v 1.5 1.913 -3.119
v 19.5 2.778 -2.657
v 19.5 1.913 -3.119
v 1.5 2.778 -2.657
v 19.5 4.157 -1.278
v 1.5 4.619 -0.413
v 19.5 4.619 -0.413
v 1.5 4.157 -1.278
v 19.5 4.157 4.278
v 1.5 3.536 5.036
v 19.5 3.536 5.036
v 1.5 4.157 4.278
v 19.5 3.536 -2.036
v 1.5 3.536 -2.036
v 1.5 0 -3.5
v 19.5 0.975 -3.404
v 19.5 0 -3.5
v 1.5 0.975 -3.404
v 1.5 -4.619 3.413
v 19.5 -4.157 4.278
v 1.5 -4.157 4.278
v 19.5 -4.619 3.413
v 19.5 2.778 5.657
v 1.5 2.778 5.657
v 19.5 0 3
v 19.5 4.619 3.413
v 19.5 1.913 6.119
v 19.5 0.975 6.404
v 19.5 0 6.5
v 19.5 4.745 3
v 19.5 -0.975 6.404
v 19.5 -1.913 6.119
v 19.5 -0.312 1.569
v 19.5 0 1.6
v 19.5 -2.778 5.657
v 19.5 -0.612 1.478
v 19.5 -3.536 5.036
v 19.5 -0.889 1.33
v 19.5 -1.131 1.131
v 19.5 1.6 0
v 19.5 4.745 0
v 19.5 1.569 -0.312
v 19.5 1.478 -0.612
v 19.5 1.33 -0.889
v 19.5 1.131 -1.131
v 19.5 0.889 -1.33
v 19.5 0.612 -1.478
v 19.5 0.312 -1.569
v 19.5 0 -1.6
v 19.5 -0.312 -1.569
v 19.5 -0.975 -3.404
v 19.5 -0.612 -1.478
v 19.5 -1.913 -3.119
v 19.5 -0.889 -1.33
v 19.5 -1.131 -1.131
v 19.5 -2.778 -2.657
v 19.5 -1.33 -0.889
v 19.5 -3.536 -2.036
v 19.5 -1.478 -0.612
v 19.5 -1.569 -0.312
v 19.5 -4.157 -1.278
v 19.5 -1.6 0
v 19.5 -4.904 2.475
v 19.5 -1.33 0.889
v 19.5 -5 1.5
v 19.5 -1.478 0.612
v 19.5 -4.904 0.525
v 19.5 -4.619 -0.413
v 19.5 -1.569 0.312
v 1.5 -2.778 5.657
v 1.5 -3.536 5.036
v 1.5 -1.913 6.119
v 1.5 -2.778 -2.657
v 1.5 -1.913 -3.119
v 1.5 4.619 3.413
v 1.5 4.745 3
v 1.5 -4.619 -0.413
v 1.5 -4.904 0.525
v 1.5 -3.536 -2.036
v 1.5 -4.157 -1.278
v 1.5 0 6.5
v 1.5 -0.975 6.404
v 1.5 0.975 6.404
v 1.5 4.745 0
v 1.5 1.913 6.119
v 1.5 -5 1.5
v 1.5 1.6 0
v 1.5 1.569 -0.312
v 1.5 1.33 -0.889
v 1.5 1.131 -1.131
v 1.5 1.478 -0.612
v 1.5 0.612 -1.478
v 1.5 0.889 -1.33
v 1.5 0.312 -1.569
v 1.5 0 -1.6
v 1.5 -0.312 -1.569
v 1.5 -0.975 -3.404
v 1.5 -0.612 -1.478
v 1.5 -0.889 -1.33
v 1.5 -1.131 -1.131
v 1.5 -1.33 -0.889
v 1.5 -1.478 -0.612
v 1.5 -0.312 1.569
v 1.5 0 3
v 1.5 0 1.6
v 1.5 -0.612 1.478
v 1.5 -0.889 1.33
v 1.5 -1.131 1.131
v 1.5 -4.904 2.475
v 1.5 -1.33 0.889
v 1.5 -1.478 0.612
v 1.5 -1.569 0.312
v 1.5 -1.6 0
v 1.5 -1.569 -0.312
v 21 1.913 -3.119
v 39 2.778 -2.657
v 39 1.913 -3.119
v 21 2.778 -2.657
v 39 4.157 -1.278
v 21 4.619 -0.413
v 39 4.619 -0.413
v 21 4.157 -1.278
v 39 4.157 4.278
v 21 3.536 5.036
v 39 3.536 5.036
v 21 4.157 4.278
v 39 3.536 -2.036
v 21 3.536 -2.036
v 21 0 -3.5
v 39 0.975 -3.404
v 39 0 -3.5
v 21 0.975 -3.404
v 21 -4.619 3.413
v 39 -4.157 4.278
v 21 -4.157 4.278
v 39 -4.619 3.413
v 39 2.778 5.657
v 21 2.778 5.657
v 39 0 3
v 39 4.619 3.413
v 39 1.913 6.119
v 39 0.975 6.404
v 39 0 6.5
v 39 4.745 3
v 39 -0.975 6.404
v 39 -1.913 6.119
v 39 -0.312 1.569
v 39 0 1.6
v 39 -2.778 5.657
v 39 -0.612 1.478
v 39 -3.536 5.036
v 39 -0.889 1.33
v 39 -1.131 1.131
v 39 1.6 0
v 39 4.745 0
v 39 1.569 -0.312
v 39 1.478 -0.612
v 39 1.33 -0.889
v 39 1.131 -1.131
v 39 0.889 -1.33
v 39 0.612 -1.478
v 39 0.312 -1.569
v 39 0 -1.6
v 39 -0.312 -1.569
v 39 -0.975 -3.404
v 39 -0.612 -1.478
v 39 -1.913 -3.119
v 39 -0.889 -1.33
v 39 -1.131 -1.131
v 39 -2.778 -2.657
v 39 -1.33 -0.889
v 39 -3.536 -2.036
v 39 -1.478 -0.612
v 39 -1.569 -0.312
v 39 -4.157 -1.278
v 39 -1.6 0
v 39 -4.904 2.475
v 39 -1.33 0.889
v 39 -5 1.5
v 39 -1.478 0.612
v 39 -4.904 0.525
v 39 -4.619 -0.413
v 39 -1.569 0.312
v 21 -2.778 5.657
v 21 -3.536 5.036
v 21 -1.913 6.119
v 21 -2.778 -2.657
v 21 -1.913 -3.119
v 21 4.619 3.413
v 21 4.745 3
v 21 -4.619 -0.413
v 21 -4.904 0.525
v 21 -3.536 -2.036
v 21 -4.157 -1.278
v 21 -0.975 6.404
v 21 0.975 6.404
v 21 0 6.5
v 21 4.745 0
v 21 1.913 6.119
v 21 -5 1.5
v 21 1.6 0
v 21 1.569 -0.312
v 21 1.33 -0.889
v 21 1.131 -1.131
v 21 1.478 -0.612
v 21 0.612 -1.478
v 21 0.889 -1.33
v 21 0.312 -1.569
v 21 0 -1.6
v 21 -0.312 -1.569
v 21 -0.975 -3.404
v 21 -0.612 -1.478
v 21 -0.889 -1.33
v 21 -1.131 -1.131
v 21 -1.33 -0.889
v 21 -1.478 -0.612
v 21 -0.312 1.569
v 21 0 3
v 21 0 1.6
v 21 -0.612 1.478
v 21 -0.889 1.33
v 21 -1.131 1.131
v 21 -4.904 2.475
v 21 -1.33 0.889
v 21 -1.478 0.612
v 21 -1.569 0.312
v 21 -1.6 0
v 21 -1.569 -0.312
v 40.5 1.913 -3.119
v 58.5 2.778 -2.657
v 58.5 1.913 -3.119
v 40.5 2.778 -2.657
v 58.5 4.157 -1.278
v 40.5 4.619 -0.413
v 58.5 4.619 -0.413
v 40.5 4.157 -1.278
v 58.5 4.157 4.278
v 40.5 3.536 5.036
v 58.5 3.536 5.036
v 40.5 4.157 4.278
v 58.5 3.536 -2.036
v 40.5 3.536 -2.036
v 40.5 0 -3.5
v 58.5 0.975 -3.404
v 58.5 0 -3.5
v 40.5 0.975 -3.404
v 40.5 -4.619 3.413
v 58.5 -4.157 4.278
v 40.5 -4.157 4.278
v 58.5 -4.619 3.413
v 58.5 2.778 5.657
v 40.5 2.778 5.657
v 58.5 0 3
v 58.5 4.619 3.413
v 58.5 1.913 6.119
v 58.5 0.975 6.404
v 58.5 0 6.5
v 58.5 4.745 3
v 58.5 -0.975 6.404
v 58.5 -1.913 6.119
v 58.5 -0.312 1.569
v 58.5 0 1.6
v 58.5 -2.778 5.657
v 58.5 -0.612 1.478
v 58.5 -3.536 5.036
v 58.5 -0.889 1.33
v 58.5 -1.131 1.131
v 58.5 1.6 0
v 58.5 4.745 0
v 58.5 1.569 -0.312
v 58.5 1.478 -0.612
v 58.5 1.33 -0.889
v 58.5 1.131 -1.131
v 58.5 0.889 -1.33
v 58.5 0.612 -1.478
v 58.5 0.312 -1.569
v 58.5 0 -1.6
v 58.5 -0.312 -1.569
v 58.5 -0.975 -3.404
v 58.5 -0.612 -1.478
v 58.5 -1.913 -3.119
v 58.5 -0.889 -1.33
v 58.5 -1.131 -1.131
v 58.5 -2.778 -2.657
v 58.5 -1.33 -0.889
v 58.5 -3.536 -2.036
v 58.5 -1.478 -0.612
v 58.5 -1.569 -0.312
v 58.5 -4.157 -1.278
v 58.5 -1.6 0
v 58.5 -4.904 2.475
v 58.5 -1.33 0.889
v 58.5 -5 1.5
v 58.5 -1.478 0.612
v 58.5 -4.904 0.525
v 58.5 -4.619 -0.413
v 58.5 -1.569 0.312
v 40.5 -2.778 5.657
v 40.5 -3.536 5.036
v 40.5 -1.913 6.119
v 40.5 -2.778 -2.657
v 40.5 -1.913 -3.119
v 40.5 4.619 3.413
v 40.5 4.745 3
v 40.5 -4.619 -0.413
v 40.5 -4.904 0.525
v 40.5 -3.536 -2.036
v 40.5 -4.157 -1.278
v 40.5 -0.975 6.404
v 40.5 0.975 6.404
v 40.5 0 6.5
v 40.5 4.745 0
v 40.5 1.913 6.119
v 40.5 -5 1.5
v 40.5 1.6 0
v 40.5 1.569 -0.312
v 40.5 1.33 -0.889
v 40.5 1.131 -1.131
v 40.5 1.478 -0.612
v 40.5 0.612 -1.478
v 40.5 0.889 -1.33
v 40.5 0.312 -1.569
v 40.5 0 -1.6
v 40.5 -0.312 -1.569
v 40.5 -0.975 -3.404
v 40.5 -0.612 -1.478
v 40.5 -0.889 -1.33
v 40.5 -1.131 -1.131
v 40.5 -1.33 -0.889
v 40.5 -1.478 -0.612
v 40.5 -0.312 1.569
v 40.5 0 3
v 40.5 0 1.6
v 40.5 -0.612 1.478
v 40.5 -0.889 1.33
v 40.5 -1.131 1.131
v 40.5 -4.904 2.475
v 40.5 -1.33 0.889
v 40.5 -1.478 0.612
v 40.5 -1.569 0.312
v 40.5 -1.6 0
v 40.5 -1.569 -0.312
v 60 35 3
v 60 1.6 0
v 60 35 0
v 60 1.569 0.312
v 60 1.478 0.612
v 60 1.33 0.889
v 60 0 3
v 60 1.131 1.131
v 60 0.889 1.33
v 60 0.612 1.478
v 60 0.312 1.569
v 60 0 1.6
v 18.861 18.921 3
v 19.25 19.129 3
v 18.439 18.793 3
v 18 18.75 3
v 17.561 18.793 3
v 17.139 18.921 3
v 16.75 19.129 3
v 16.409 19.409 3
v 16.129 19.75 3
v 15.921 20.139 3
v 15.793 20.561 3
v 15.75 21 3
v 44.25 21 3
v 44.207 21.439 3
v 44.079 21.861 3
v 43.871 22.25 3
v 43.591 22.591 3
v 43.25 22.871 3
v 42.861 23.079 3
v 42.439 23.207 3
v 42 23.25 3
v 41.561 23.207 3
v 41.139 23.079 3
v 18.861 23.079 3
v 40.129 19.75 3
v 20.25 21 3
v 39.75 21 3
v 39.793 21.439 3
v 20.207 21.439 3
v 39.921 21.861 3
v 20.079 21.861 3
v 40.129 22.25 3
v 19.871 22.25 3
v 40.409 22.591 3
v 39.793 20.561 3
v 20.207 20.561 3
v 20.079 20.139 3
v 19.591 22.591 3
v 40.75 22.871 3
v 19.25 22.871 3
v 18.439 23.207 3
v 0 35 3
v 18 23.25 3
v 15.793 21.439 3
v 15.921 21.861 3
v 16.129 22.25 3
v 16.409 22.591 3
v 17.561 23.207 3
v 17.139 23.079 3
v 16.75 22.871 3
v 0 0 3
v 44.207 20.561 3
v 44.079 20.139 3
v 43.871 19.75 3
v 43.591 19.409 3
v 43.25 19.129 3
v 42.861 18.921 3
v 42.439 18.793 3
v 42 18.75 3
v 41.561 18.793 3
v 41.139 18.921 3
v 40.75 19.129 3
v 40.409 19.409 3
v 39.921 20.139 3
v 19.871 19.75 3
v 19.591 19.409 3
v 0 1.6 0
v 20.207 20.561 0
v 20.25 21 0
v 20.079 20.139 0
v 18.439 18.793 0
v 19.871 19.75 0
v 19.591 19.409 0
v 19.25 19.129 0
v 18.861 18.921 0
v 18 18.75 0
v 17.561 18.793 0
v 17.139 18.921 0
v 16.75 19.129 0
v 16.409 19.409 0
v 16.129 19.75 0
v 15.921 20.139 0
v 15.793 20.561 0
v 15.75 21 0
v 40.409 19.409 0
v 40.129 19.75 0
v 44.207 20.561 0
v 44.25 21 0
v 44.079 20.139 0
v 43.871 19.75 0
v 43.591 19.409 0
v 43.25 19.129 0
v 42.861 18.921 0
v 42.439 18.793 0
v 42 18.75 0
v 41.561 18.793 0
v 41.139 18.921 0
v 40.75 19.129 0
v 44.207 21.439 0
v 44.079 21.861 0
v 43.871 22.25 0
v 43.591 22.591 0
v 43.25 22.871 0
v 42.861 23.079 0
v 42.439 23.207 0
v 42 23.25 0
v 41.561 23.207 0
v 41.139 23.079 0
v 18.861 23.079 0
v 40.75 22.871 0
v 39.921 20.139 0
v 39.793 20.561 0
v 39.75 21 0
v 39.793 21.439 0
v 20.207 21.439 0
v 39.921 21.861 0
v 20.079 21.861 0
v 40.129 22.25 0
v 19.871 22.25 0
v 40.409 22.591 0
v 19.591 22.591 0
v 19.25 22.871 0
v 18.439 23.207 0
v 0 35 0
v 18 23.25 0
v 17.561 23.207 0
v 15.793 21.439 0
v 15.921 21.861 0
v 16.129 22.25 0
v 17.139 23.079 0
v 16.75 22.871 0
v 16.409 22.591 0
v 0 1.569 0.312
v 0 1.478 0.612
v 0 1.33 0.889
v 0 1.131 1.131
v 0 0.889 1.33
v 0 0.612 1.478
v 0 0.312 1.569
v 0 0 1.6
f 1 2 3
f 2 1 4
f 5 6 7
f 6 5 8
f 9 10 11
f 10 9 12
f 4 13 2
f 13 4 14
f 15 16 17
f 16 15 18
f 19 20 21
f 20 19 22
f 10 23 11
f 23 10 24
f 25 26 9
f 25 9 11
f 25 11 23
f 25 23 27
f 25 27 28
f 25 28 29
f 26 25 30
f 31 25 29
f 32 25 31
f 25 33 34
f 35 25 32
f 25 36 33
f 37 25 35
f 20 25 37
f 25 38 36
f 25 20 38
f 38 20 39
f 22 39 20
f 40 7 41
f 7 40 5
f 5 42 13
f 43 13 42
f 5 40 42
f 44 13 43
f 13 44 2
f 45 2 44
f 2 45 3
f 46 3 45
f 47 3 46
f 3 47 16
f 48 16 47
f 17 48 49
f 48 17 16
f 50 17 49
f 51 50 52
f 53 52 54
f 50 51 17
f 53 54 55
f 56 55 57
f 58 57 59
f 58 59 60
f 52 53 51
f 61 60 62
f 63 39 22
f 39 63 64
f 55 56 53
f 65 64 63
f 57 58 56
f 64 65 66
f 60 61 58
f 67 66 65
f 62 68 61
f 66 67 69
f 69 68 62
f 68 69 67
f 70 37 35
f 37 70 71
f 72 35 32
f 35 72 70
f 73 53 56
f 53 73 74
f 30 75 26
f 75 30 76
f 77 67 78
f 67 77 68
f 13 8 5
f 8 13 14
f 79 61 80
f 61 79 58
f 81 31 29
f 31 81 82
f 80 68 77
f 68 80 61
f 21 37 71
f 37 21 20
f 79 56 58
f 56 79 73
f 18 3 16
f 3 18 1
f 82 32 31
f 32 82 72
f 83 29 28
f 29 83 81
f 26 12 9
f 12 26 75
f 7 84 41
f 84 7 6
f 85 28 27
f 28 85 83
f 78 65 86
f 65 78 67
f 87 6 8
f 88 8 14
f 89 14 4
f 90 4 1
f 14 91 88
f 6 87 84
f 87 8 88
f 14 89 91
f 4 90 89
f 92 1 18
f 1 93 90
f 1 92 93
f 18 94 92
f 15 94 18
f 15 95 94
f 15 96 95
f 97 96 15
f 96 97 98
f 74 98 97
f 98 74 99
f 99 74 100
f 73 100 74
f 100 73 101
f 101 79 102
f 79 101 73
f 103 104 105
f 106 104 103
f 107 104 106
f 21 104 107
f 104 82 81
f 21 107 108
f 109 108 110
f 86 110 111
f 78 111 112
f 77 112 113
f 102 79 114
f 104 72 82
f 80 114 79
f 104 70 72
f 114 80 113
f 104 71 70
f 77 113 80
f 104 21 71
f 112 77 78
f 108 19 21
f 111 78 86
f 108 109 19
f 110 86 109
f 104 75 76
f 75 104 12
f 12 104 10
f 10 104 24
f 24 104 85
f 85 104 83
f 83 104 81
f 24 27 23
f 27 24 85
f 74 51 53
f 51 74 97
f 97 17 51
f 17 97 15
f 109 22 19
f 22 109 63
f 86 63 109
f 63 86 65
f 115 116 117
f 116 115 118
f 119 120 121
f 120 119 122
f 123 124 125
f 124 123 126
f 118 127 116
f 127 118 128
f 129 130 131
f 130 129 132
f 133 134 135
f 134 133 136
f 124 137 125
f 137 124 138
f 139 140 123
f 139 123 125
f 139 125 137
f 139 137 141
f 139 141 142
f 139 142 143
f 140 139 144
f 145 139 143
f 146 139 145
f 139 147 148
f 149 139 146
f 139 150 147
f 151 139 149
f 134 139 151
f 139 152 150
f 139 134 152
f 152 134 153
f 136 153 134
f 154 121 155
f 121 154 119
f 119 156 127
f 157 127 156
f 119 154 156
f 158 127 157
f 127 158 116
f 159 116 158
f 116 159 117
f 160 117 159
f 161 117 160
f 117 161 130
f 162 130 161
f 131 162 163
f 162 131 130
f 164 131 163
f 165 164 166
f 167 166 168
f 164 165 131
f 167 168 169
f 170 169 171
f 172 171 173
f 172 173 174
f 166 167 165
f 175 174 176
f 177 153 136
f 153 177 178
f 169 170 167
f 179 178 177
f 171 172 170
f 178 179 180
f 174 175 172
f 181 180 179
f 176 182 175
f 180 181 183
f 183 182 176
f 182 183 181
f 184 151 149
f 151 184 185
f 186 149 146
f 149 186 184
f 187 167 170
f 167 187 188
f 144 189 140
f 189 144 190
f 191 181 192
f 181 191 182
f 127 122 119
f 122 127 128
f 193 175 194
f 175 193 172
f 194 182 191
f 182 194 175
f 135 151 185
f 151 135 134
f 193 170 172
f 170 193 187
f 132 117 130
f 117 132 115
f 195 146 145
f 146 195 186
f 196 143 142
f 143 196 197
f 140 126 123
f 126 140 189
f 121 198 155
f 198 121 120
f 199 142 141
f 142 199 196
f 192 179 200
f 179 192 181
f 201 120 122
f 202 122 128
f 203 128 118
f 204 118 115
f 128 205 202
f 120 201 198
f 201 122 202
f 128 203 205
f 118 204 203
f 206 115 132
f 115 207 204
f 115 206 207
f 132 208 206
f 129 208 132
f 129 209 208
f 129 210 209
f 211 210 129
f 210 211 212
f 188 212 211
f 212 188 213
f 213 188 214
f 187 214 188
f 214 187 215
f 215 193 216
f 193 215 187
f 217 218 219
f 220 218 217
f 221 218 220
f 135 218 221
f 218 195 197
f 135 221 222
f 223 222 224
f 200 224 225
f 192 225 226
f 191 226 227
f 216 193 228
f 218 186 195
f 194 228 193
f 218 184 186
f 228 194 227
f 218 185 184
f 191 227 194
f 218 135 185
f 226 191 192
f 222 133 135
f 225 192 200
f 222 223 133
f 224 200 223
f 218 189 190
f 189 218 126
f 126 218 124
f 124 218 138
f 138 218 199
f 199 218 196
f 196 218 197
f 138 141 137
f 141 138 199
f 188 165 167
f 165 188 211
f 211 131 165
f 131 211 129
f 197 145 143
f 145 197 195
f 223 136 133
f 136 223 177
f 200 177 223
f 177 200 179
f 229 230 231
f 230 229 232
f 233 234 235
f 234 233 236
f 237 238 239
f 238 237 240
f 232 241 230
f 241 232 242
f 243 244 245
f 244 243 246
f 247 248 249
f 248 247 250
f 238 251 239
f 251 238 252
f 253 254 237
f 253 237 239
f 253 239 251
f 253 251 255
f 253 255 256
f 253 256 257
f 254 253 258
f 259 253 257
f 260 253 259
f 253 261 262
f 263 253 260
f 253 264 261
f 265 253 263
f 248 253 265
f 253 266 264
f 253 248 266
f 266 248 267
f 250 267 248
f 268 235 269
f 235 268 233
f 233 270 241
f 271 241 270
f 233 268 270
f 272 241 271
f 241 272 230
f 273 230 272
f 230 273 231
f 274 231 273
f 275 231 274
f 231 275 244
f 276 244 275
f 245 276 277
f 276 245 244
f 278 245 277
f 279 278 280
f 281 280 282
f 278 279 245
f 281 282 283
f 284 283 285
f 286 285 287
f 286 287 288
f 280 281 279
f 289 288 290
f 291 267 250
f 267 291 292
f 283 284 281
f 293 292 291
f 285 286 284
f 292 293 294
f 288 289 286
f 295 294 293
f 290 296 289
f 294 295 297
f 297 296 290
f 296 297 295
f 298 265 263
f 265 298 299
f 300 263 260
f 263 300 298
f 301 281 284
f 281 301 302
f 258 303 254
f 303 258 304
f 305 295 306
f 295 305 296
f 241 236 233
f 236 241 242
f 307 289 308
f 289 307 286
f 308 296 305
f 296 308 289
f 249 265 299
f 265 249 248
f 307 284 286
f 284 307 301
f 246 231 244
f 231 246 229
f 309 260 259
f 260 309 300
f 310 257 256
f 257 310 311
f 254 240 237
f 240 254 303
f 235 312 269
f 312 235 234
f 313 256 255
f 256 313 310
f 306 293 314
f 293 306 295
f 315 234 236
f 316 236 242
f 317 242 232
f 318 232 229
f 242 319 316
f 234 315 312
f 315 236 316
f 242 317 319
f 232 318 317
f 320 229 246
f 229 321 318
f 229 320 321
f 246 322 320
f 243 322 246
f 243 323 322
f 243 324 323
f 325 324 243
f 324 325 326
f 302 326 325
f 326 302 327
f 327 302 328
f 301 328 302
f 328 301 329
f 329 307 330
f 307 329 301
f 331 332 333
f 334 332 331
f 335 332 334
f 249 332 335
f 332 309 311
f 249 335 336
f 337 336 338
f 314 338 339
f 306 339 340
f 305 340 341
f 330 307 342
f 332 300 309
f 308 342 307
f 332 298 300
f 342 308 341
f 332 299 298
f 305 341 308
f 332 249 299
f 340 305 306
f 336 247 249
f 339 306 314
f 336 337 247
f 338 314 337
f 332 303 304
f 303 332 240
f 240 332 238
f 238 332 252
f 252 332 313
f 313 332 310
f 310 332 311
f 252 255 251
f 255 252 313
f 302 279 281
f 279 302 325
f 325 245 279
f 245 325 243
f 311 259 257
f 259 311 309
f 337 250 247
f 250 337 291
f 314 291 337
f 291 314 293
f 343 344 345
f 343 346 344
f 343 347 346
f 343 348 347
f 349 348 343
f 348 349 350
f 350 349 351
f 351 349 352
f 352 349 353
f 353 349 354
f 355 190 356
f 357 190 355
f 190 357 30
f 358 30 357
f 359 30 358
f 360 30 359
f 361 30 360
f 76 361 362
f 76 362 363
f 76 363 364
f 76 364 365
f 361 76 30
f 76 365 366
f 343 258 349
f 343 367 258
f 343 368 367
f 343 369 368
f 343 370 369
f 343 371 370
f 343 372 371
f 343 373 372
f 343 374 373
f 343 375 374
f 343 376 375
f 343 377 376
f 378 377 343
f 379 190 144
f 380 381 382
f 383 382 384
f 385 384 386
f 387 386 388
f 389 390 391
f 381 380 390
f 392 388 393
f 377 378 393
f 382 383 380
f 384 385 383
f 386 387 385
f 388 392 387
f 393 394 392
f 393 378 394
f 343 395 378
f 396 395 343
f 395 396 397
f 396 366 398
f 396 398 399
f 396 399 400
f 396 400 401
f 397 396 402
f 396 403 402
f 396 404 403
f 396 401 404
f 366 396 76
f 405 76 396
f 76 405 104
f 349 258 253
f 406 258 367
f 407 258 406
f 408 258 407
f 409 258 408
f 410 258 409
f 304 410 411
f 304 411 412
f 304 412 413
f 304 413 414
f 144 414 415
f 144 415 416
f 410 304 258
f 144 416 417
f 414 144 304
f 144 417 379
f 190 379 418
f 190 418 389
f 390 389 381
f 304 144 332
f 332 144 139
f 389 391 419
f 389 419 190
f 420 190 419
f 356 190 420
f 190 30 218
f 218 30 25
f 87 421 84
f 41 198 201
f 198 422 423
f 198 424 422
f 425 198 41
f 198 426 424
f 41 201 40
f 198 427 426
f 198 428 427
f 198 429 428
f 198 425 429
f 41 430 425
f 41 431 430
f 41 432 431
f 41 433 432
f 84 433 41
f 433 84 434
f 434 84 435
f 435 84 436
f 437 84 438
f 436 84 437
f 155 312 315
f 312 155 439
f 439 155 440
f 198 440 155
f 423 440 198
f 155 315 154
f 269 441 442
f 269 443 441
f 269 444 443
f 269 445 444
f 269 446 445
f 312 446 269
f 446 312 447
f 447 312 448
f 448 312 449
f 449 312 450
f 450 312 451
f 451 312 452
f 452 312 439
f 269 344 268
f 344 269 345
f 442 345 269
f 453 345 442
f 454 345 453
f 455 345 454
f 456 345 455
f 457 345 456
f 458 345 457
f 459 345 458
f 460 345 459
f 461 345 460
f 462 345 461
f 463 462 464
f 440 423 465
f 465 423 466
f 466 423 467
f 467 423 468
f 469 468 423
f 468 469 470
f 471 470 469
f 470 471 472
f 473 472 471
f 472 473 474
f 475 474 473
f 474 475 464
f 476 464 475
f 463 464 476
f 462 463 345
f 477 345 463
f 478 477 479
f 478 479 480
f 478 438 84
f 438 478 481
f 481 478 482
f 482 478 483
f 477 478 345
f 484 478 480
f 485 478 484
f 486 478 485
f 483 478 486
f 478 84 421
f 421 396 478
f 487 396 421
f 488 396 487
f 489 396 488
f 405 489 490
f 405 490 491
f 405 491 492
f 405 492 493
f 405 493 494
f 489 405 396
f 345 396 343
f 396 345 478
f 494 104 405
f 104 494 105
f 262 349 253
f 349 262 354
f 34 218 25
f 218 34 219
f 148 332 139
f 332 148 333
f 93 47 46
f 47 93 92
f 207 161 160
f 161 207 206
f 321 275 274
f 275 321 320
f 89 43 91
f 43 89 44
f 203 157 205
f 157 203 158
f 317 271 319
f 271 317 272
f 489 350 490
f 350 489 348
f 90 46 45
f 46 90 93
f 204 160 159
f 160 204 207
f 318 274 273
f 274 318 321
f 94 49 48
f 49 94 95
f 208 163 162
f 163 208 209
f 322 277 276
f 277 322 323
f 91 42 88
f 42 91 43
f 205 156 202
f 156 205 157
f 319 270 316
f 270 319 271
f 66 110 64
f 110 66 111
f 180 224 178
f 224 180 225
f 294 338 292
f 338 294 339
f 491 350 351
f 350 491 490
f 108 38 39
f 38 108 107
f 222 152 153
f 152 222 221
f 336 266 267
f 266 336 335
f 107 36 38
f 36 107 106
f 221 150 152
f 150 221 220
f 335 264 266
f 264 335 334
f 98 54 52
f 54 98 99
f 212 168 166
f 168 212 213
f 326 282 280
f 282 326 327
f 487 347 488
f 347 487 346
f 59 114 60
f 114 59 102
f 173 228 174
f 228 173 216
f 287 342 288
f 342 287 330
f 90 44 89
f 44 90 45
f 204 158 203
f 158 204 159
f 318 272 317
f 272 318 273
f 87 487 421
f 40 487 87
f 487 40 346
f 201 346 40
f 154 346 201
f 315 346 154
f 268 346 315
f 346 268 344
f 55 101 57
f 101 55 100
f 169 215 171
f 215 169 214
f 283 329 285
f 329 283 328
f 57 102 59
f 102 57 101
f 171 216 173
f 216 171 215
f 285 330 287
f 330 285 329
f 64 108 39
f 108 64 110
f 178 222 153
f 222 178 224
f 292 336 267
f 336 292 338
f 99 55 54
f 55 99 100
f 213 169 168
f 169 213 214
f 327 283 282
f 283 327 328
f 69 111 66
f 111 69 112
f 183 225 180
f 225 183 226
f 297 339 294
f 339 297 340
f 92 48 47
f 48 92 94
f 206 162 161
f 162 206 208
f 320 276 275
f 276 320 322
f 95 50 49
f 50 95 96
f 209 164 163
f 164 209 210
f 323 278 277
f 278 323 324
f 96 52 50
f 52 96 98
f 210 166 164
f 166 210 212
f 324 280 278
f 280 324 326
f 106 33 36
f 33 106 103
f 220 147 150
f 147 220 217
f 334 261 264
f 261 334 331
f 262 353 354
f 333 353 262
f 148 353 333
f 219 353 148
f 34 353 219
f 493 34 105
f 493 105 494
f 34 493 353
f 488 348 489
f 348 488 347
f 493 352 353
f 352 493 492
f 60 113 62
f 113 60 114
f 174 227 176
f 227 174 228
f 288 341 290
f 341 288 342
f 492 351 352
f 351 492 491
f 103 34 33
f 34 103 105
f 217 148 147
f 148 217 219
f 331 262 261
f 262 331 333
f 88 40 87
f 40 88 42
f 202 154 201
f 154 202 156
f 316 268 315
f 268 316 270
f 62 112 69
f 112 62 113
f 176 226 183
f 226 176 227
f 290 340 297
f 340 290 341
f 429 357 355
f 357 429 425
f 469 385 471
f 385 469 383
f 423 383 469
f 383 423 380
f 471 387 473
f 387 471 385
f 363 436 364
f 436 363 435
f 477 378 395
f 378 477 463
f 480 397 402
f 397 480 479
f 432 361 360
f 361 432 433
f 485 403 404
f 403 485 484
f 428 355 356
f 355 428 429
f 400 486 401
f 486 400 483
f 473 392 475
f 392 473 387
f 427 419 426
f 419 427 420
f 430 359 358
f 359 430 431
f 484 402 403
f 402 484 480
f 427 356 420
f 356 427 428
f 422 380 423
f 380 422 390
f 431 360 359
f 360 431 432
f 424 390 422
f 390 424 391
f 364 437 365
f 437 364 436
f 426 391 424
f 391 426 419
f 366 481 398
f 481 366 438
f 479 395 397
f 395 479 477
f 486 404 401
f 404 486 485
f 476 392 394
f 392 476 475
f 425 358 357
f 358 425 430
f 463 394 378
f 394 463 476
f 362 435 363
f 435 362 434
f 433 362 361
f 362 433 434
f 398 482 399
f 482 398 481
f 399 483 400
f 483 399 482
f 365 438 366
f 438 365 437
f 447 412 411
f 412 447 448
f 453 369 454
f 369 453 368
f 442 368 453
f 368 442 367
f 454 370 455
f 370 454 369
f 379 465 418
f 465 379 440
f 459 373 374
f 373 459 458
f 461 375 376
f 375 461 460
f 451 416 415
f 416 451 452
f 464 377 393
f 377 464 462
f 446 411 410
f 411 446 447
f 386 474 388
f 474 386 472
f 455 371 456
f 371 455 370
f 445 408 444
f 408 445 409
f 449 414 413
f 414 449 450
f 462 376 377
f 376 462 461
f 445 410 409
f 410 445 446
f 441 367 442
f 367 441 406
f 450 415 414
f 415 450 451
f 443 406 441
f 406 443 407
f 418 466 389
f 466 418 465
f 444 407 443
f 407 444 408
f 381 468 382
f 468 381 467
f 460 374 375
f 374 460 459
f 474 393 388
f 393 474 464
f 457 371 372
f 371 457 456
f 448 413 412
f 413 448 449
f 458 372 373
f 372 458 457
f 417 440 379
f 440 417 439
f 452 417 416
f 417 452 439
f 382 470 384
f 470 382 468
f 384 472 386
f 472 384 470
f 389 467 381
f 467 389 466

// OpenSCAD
$fn = 32;

// ----------------------------------------------------------------------
// Hinge leaf: 60 x 40 x 10 mm
// ----------------------------------------------------------------------

// --- parameters (mm) ---
leaf_len = 60;            // leaf length, X
leaf_w = 35;              // leaf width, Y
leaf_t = 3;               // leaf thickness
knuckle_d = 10;           // knuckle diameter
knuckle_w = 18;           // knuckle width
knuckle_n = 3;            // number of knuckles
pin_d = 3.2;              // pin bore
gap = 1.5;                // gap between the knuckles
screw_d = 4.5;            // screw clearance

module leaf() {
  cube([leaf_len, leaf_w, leaf_t]);
}

module knuckles() {
  /* barrels sit on the leaf edge, the pin axis at half the leaf thickness */
  for (i = [0 : knuckle_n - 1])
    translate([gap + i * (knuckle_w + gap), 0, leaf_t * 0.5])
      rotate([0, 90, 0]) cylinder(h = knuckle_w, d = knuckle_d);
}

difference() {
  union() {
    leaf();
    knuckles();
  }
  rotate([0, 90, 0]) translate([0, 0, -1])
    cylinder(h = leaf_len + 2, d = pin_d);
  translate([18, leaf_w * 0.6, -1]) cylinder(h = leaf_t + 2, d = screw_d);
  translate([42, leaf_w * 0.6, -1]) cylinder(h = leaf_t + 2, d = screw_d);
}
